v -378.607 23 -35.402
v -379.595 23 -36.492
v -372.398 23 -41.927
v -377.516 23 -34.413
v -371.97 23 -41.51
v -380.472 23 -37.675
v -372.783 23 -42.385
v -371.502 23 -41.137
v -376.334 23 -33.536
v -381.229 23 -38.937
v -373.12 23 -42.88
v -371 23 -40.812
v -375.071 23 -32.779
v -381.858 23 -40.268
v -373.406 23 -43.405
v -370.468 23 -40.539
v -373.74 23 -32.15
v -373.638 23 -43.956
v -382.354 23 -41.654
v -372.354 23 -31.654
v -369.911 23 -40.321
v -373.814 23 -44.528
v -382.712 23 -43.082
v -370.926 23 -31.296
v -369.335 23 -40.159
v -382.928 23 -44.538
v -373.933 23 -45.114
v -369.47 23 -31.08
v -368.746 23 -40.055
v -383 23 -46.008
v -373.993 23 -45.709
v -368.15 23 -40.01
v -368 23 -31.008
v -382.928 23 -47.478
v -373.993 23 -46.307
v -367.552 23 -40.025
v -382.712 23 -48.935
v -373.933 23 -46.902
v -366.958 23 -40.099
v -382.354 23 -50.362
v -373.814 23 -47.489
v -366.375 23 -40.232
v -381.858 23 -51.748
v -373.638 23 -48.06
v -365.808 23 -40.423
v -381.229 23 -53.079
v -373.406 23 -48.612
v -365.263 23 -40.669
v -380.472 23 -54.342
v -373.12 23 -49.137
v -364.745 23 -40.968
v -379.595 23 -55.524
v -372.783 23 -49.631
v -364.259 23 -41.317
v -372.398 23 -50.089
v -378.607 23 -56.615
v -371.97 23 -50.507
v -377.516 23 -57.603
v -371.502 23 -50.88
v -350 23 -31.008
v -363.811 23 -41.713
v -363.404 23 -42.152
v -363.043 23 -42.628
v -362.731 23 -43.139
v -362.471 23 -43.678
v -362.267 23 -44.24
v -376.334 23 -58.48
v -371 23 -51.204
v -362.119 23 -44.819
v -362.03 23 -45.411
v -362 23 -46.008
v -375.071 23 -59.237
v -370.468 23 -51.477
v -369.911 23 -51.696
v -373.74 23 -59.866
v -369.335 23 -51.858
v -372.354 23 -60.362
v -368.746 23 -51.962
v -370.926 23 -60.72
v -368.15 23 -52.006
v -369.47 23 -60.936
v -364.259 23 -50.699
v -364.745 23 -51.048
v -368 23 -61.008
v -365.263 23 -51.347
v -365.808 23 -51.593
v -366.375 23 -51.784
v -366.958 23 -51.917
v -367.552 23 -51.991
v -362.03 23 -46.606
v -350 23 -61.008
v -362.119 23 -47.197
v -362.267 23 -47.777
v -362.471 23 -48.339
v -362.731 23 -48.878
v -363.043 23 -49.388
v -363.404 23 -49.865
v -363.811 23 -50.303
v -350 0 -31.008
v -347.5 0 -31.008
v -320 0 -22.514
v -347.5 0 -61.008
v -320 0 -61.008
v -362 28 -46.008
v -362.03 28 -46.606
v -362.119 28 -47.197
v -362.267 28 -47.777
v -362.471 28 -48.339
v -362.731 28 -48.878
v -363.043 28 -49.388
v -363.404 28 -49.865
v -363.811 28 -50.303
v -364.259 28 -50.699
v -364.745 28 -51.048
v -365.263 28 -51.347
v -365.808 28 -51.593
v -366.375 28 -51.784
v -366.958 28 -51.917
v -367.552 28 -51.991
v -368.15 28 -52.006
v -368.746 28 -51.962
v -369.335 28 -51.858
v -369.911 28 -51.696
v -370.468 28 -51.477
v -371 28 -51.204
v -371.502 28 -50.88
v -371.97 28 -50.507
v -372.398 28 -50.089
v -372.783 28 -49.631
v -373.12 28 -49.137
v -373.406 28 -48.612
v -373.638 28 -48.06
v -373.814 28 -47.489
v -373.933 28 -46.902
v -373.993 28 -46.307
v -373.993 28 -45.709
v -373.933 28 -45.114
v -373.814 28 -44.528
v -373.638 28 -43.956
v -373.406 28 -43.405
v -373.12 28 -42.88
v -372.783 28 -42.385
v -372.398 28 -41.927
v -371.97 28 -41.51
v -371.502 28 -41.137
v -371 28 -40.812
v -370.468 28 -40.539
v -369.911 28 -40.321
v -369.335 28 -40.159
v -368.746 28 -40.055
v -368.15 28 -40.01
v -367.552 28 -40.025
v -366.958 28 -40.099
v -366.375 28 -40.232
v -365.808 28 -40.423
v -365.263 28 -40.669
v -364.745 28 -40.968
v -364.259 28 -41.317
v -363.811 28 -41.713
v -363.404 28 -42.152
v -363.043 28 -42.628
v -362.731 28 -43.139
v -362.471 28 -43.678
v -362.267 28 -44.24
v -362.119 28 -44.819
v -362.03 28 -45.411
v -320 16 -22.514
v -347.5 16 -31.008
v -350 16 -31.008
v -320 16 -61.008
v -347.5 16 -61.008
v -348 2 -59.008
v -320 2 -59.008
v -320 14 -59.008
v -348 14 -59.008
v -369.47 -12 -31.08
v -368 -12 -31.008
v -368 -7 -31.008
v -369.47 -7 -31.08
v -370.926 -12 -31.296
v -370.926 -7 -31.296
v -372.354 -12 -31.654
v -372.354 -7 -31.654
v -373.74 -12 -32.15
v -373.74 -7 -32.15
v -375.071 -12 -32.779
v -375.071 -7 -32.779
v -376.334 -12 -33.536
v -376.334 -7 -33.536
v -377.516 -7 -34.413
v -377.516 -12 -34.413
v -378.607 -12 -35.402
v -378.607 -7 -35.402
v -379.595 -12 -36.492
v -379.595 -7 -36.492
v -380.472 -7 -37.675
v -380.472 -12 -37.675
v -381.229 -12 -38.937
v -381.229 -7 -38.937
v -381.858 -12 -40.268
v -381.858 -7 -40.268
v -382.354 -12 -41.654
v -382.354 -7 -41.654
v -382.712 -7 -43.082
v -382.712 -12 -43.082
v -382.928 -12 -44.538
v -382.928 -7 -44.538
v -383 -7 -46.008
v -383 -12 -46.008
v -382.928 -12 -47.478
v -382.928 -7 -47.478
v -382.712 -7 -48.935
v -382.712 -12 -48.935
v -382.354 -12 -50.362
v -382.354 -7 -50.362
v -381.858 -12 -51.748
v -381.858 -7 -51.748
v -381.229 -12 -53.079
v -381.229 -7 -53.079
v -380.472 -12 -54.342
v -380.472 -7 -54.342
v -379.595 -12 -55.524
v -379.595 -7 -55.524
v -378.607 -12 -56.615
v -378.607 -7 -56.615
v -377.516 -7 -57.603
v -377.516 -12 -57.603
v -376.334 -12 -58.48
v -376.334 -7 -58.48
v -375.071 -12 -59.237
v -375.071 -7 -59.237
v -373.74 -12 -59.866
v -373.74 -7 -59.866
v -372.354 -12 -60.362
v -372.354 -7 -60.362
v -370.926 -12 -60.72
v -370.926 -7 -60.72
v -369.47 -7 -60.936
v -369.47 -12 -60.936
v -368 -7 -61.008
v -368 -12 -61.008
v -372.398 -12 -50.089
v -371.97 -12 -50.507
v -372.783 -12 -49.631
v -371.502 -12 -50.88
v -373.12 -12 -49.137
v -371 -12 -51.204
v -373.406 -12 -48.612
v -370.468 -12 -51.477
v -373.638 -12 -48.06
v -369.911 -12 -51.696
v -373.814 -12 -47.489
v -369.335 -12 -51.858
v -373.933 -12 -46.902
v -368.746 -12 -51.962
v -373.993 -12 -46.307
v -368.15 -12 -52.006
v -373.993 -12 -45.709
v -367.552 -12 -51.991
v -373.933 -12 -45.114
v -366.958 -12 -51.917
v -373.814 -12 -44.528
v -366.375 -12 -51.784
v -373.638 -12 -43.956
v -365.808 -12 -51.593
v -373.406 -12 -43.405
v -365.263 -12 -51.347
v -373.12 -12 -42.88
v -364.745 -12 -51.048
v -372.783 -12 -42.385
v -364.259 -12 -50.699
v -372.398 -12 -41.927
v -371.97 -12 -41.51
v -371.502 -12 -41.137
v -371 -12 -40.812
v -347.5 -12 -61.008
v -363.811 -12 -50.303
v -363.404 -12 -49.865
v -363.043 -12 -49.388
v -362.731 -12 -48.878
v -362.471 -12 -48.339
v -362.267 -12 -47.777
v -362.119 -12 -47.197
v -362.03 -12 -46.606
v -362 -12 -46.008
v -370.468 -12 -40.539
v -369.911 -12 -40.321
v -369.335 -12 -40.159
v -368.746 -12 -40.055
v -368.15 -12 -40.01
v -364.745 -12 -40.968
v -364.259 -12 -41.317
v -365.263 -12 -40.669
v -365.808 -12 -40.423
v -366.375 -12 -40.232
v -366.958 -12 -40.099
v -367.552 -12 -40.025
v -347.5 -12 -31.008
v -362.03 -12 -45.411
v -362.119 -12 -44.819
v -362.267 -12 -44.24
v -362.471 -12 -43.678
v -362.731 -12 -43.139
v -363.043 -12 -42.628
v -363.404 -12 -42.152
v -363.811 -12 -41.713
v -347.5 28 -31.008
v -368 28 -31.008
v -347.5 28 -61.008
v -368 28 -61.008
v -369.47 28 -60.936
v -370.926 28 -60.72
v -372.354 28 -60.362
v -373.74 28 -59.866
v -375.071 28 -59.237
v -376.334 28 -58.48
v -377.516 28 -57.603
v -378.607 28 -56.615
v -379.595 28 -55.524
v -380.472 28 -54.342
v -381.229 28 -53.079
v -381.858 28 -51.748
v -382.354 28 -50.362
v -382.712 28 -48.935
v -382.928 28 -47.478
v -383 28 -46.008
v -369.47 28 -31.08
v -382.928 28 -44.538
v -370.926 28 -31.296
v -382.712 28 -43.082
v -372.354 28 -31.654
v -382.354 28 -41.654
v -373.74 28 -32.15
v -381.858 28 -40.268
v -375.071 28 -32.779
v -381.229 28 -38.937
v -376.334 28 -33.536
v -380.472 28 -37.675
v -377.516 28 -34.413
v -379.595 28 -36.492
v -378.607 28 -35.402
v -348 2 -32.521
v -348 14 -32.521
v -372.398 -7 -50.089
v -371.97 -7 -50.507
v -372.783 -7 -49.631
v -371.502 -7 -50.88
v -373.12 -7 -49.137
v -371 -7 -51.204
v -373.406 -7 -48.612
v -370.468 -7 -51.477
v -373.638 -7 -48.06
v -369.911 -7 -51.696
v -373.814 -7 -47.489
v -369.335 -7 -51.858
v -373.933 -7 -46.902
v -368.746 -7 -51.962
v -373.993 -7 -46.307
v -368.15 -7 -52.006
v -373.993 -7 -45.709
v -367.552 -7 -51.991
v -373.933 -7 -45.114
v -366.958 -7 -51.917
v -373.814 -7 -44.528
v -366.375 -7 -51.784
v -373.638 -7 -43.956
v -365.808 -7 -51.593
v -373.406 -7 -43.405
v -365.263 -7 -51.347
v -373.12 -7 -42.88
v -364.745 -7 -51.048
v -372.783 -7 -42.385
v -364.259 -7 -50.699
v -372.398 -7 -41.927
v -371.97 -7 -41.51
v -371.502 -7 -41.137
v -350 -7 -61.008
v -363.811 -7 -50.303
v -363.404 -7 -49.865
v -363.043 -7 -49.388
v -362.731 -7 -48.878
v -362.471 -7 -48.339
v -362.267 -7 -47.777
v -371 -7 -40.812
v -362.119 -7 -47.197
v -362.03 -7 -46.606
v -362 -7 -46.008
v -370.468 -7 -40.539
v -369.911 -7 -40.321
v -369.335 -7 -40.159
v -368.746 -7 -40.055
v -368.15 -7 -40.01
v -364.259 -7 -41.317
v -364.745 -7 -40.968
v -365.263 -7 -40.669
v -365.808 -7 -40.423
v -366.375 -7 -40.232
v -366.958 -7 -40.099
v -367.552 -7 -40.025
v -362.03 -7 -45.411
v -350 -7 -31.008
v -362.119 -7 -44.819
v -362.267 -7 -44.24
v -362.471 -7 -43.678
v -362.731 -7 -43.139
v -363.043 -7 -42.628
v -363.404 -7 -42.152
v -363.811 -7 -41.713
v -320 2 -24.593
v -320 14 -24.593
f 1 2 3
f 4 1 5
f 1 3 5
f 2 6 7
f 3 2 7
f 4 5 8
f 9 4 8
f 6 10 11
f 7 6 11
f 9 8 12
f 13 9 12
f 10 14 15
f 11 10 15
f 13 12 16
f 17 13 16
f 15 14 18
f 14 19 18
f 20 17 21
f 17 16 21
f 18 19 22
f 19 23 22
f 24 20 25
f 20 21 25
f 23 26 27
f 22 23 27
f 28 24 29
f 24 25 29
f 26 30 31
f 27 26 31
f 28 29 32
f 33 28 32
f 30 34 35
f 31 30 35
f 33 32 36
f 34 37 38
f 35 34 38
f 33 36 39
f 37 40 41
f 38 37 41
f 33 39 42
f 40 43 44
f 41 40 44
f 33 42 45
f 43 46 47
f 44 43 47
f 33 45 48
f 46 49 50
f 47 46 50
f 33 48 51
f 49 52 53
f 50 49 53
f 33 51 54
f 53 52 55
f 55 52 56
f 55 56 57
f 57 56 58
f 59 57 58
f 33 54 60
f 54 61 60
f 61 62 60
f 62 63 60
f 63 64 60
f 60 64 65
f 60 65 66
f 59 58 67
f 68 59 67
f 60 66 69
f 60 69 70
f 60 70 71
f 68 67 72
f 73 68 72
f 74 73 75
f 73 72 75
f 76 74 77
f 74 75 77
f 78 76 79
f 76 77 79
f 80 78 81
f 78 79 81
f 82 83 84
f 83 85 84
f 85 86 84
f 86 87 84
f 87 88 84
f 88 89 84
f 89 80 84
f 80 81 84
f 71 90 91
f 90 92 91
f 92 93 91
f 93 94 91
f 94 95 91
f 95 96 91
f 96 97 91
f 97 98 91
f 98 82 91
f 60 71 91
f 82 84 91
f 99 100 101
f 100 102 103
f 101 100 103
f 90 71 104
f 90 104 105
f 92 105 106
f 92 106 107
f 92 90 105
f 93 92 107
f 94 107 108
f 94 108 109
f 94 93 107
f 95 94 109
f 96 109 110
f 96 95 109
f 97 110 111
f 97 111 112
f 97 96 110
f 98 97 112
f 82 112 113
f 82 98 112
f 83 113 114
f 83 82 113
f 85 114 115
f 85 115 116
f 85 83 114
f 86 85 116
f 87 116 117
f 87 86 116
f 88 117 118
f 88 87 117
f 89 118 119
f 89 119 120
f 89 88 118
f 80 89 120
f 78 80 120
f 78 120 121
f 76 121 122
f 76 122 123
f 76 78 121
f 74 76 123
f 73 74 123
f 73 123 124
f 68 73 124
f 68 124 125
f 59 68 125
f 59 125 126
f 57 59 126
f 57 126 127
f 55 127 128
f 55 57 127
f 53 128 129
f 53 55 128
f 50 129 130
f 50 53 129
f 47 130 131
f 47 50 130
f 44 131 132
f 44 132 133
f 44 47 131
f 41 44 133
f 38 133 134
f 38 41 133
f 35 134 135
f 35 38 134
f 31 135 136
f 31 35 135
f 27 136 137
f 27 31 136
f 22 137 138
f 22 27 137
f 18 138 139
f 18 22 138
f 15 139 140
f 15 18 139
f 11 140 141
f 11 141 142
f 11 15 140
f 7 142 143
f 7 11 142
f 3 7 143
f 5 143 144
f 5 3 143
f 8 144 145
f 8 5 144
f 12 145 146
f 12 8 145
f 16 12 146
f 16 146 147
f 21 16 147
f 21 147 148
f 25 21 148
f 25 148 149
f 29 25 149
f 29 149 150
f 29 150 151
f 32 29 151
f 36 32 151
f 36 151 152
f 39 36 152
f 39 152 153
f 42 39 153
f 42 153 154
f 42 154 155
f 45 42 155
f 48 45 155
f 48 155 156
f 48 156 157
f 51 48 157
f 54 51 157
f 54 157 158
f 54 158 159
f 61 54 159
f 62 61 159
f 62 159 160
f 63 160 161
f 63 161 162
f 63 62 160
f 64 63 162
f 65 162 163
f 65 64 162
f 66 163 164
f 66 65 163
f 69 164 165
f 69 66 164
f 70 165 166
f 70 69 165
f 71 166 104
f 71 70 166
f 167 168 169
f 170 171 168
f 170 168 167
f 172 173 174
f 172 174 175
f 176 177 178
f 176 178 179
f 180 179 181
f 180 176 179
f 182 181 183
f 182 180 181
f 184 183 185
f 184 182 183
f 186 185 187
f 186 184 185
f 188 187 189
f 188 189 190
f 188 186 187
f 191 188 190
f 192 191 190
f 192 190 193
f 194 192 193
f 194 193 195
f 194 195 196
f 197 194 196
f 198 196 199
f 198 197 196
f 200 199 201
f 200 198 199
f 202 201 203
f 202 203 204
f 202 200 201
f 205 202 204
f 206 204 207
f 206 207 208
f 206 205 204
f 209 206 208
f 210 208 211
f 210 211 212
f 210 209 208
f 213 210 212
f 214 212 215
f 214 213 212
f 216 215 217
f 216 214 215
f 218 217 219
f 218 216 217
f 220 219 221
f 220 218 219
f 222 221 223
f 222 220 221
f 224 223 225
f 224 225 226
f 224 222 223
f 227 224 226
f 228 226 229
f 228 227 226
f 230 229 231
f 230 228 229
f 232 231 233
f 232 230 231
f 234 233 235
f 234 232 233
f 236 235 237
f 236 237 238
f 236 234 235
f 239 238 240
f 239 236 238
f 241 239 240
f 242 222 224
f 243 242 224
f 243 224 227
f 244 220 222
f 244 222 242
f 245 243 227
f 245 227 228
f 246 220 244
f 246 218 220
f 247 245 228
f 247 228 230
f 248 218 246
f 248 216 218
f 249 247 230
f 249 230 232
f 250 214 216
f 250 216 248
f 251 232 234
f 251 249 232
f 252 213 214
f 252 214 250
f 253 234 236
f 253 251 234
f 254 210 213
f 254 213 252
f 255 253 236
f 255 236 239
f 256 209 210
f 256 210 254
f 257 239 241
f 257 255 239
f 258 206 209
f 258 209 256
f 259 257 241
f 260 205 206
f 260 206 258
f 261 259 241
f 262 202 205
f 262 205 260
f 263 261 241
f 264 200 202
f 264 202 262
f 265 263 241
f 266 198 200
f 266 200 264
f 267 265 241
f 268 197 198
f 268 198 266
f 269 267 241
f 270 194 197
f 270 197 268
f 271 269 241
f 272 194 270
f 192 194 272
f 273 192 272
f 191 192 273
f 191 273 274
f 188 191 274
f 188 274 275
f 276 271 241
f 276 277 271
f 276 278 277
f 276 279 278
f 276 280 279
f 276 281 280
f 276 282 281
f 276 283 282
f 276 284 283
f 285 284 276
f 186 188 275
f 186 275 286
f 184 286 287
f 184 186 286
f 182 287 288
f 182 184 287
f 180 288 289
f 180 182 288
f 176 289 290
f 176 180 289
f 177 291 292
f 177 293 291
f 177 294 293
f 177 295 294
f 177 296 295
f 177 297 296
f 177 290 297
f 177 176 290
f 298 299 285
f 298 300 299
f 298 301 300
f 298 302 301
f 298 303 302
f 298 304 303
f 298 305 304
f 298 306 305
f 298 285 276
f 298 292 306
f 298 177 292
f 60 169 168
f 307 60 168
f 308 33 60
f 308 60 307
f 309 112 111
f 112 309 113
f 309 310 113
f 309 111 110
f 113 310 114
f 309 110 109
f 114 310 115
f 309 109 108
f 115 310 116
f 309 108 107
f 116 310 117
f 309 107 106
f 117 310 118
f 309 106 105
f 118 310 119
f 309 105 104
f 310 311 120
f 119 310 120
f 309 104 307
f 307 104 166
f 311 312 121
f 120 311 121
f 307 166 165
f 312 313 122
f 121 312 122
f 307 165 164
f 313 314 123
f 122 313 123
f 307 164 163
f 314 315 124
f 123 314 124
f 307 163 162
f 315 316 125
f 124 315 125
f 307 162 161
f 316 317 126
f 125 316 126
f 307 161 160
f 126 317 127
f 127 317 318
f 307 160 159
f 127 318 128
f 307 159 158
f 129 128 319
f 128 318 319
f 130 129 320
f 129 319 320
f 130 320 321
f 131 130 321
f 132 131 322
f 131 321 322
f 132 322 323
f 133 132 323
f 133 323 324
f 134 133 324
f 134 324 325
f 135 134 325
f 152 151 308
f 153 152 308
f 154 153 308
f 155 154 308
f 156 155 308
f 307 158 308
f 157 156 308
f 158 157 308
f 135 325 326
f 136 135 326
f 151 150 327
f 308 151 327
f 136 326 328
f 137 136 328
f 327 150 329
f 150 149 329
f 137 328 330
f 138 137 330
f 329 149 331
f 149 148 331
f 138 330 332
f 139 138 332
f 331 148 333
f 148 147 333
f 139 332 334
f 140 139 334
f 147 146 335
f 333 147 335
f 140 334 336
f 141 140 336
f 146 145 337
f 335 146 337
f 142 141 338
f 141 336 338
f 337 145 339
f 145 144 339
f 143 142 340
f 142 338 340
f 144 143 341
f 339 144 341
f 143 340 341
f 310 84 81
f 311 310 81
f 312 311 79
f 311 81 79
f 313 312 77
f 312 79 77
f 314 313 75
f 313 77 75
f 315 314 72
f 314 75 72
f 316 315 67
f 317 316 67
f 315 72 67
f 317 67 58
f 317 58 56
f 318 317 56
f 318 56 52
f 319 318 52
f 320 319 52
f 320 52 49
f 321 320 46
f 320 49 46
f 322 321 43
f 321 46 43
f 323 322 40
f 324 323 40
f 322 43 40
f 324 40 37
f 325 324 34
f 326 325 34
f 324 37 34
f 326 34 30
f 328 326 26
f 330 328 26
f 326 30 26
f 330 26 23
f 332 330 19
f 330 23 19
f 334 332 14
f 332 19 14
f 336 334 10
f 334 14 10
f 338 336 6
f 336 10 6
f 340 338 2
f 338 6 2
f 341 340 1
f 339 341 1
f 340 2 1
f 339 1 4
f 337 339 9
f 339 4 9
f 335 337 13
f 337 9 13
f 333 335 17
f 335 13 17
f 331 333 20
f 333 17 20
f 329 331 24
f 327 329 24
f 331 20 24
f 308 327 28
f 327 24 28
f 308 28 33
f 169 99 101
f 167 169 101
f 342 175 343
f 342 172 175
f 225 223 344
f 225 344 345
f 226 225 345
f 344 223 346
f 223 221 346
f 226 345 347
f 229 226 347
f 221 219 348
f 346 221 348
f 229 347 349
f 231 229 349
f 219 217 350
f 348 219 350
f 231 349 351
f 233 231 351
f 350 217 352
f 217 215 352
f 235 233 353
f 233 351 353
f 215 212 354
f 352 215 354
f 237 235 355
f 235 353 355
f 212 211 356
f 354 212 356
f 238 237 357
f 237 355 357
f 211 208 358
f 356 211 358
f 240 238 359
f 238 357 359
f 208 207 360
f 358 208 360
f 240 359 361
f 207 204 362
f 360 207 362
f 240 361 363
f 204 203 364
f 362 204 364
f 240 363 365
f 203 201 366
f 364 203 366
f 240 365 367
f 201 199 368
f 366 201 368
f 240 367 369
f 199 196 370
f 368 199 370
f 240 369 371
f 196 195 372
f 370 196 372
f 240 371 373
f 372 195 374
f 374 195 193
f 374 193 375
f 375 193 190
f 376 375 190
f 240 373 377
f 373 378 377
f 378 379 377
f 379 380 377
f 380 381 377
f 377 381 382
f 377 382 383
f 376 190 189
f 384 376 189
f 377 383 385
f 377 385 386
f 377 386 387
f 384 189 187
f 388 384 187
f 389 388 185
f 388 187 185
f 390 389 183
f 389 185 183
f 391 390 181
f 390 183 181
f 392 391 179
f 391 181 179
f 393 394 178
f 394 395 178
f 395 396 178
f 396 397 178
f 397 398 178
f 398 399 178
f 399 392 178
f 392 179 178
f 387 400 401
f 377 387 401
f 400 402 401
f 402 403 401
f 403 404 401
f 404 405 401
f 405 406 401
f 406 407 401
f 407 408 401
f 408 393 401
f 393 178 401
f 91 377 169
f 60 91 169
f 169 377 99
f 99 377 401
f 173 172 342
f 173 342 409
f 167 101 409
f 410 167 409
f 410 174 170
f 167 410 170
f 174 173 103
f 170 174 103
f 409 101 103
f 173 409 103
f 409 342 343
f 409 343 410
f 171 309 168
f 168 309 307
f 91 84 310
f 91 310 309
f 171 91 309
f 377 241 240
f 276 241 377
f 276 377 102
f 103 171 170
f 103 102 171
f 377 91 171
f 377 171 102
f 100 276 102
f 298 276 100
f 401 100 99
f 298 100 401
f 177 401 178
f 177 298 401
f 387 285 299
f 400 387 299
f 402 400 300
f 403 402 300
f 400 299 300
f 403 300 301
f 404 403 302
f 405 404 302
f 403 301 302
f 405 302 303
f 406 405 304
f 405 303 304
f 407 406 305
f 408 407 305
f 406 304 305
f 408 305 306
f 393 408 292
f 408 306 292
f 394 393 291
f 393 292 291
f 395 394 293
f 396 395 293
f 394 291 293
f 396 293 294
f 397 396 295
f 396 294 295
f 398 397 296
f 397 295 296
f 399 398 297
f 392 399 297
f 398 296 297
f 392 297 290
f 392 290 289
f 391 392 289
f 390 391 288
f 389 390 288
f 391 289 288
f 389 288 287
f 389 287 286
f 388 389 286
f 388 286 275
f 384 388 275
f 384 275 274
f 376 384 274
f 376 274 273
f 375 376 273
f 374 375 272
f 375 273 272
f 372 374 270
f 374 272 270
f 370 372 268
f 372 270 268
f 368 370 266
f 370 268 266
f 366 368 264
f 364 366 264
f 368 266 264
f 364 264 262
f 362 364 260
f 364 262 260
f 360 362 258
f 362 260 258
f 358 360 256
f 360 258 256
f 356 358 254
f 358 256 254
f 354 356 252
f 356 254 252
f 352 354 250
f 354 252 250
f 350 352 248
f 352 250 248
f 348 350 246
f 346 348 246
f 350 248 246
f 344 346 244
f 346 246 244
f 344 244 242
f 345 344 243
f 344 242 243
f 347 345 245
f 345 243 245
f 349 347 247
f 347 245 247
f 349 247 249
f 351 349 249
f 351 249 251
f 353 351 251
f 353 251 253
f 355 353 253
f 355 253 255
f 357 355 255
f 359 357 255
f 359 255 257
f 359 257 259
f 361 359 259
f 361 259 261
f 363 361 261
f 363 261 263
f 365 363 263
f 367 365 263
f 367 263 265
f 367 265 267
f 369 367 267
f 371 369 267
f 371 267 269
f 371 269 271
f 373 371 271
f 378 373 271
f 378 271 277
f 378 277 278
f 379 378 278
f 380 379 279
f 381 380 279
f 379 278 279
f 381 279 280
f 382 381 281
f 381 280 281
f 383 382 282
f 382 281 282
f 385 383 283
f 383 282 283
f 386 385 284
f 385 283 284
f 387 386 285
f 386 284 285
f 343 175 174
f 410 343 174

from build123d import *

# Parameters (mm, degrees)
BOSS_EXTRUDE1_DEPTH = 16
SHELL1_T            = -2
SKETCH2_R           = 6
BOSS_EXTRUDE2_DEPTH = 5
SKETCH4_W           = 30
SKETCH4_H           = 12
BOSS_EXTRUDE3_DEPTH = 2.5
SKETCH5_R           = 6
BOSS_EXTRUDE4_DEPTH = 5


with BuildPart() as part:
    # Sketch1 → Boss-Extrude1 (new body)
    with BuildSketch(Plane(origin=(0, 0, 0), x_dir=(1, 0, 0), z_dir=(0, 1, 0))):
        Polygon((-350, 31.008229654), (-320, 22.514402641), (-320, 61.008229654), (-350, 61.008229654), align=None)
    extrude(amount=BOSS_EXTRUDE1_DEPTH)

    # Shell1
    shell1_openings = [part.faces().sort_by_distance(p)[0] for p in [
        (-320, 8, -41.761316148),
    ]]
    offset(amount=SHELL1_T, openings=shell1_openings, kind=Kind.INTERSECTION)



with BuildPart() as body_2:
    # Sketch2 → Boss-Extrude2 (new body)
    with BuildSketch(Plane(origin=(0, 23, 0), x_dir=(1, 0, 0), z_dir=(0, 1, 0))):
        with BuildLine():
            Line((-350, 61.008229654), (-368, 61.008229654))
            ThreePointArc((-368, 61.008229654), (-383, 46.008229654), (-368, 31.008229654))
            Line((-368, 31.008229654), (-350, 31.008229654))
            Line((-350, 31.008229654), (-350, 61.008229654))
        make_face()
        with Locations((-368, 46.008229654)):
            Circle(SKETCH2_R, mode=Mode.SUBTRACT)
    extrude(amount=BOSS_EXTRUDE2_DEPTH)


with BuildPart() as part_1:
    add(part.part)

    add(body_2.part)  # Boss-Extrude3 merges body 2
    # Sketch4 → Boss-Extrude3 (add)
    with BuildSketch(Plane.ZY.offset(350)):
        with Locations((-46.008229654, 22)):
            Rectangle(SKETCH4_W, SKETCH4_H)
    boss_extrude3 = extrude(amount=-BOSS_EXTRUDE3_DEPTH)

    # Mirror14: Boss-Extrude3 across plane
    add(boss_extrude3.mirror(Plane(origin=(0, 8, 0), x_dir=(0, 0, 1), z_dir=(0, -1, 0))))

    # Sketch5 → Boss-Extrude4 (add)
    with BuildSketch(Plane.XZ.offset(12)):
        with BuildLine():
            Line((-350, -61.008229654), (-350, -31.008229654))
            Line((-350, -31.008229654), (-368, -31.008229654))
            ThreePointArc((-368, -31.008229654), (-383, -46.008229654), (-368, -61.008229654))
            Line((-368, -61.008229654), (-350, -61.008229654))
        make_face()
        with Locations((-368, -46.008229654)):
            Circle(SKETCH5_R, mode=Mode.SUBTRACT)
    extrude(amount=-BOSS_EXTRUDE4_DEPTH)


solid = part_1.part
